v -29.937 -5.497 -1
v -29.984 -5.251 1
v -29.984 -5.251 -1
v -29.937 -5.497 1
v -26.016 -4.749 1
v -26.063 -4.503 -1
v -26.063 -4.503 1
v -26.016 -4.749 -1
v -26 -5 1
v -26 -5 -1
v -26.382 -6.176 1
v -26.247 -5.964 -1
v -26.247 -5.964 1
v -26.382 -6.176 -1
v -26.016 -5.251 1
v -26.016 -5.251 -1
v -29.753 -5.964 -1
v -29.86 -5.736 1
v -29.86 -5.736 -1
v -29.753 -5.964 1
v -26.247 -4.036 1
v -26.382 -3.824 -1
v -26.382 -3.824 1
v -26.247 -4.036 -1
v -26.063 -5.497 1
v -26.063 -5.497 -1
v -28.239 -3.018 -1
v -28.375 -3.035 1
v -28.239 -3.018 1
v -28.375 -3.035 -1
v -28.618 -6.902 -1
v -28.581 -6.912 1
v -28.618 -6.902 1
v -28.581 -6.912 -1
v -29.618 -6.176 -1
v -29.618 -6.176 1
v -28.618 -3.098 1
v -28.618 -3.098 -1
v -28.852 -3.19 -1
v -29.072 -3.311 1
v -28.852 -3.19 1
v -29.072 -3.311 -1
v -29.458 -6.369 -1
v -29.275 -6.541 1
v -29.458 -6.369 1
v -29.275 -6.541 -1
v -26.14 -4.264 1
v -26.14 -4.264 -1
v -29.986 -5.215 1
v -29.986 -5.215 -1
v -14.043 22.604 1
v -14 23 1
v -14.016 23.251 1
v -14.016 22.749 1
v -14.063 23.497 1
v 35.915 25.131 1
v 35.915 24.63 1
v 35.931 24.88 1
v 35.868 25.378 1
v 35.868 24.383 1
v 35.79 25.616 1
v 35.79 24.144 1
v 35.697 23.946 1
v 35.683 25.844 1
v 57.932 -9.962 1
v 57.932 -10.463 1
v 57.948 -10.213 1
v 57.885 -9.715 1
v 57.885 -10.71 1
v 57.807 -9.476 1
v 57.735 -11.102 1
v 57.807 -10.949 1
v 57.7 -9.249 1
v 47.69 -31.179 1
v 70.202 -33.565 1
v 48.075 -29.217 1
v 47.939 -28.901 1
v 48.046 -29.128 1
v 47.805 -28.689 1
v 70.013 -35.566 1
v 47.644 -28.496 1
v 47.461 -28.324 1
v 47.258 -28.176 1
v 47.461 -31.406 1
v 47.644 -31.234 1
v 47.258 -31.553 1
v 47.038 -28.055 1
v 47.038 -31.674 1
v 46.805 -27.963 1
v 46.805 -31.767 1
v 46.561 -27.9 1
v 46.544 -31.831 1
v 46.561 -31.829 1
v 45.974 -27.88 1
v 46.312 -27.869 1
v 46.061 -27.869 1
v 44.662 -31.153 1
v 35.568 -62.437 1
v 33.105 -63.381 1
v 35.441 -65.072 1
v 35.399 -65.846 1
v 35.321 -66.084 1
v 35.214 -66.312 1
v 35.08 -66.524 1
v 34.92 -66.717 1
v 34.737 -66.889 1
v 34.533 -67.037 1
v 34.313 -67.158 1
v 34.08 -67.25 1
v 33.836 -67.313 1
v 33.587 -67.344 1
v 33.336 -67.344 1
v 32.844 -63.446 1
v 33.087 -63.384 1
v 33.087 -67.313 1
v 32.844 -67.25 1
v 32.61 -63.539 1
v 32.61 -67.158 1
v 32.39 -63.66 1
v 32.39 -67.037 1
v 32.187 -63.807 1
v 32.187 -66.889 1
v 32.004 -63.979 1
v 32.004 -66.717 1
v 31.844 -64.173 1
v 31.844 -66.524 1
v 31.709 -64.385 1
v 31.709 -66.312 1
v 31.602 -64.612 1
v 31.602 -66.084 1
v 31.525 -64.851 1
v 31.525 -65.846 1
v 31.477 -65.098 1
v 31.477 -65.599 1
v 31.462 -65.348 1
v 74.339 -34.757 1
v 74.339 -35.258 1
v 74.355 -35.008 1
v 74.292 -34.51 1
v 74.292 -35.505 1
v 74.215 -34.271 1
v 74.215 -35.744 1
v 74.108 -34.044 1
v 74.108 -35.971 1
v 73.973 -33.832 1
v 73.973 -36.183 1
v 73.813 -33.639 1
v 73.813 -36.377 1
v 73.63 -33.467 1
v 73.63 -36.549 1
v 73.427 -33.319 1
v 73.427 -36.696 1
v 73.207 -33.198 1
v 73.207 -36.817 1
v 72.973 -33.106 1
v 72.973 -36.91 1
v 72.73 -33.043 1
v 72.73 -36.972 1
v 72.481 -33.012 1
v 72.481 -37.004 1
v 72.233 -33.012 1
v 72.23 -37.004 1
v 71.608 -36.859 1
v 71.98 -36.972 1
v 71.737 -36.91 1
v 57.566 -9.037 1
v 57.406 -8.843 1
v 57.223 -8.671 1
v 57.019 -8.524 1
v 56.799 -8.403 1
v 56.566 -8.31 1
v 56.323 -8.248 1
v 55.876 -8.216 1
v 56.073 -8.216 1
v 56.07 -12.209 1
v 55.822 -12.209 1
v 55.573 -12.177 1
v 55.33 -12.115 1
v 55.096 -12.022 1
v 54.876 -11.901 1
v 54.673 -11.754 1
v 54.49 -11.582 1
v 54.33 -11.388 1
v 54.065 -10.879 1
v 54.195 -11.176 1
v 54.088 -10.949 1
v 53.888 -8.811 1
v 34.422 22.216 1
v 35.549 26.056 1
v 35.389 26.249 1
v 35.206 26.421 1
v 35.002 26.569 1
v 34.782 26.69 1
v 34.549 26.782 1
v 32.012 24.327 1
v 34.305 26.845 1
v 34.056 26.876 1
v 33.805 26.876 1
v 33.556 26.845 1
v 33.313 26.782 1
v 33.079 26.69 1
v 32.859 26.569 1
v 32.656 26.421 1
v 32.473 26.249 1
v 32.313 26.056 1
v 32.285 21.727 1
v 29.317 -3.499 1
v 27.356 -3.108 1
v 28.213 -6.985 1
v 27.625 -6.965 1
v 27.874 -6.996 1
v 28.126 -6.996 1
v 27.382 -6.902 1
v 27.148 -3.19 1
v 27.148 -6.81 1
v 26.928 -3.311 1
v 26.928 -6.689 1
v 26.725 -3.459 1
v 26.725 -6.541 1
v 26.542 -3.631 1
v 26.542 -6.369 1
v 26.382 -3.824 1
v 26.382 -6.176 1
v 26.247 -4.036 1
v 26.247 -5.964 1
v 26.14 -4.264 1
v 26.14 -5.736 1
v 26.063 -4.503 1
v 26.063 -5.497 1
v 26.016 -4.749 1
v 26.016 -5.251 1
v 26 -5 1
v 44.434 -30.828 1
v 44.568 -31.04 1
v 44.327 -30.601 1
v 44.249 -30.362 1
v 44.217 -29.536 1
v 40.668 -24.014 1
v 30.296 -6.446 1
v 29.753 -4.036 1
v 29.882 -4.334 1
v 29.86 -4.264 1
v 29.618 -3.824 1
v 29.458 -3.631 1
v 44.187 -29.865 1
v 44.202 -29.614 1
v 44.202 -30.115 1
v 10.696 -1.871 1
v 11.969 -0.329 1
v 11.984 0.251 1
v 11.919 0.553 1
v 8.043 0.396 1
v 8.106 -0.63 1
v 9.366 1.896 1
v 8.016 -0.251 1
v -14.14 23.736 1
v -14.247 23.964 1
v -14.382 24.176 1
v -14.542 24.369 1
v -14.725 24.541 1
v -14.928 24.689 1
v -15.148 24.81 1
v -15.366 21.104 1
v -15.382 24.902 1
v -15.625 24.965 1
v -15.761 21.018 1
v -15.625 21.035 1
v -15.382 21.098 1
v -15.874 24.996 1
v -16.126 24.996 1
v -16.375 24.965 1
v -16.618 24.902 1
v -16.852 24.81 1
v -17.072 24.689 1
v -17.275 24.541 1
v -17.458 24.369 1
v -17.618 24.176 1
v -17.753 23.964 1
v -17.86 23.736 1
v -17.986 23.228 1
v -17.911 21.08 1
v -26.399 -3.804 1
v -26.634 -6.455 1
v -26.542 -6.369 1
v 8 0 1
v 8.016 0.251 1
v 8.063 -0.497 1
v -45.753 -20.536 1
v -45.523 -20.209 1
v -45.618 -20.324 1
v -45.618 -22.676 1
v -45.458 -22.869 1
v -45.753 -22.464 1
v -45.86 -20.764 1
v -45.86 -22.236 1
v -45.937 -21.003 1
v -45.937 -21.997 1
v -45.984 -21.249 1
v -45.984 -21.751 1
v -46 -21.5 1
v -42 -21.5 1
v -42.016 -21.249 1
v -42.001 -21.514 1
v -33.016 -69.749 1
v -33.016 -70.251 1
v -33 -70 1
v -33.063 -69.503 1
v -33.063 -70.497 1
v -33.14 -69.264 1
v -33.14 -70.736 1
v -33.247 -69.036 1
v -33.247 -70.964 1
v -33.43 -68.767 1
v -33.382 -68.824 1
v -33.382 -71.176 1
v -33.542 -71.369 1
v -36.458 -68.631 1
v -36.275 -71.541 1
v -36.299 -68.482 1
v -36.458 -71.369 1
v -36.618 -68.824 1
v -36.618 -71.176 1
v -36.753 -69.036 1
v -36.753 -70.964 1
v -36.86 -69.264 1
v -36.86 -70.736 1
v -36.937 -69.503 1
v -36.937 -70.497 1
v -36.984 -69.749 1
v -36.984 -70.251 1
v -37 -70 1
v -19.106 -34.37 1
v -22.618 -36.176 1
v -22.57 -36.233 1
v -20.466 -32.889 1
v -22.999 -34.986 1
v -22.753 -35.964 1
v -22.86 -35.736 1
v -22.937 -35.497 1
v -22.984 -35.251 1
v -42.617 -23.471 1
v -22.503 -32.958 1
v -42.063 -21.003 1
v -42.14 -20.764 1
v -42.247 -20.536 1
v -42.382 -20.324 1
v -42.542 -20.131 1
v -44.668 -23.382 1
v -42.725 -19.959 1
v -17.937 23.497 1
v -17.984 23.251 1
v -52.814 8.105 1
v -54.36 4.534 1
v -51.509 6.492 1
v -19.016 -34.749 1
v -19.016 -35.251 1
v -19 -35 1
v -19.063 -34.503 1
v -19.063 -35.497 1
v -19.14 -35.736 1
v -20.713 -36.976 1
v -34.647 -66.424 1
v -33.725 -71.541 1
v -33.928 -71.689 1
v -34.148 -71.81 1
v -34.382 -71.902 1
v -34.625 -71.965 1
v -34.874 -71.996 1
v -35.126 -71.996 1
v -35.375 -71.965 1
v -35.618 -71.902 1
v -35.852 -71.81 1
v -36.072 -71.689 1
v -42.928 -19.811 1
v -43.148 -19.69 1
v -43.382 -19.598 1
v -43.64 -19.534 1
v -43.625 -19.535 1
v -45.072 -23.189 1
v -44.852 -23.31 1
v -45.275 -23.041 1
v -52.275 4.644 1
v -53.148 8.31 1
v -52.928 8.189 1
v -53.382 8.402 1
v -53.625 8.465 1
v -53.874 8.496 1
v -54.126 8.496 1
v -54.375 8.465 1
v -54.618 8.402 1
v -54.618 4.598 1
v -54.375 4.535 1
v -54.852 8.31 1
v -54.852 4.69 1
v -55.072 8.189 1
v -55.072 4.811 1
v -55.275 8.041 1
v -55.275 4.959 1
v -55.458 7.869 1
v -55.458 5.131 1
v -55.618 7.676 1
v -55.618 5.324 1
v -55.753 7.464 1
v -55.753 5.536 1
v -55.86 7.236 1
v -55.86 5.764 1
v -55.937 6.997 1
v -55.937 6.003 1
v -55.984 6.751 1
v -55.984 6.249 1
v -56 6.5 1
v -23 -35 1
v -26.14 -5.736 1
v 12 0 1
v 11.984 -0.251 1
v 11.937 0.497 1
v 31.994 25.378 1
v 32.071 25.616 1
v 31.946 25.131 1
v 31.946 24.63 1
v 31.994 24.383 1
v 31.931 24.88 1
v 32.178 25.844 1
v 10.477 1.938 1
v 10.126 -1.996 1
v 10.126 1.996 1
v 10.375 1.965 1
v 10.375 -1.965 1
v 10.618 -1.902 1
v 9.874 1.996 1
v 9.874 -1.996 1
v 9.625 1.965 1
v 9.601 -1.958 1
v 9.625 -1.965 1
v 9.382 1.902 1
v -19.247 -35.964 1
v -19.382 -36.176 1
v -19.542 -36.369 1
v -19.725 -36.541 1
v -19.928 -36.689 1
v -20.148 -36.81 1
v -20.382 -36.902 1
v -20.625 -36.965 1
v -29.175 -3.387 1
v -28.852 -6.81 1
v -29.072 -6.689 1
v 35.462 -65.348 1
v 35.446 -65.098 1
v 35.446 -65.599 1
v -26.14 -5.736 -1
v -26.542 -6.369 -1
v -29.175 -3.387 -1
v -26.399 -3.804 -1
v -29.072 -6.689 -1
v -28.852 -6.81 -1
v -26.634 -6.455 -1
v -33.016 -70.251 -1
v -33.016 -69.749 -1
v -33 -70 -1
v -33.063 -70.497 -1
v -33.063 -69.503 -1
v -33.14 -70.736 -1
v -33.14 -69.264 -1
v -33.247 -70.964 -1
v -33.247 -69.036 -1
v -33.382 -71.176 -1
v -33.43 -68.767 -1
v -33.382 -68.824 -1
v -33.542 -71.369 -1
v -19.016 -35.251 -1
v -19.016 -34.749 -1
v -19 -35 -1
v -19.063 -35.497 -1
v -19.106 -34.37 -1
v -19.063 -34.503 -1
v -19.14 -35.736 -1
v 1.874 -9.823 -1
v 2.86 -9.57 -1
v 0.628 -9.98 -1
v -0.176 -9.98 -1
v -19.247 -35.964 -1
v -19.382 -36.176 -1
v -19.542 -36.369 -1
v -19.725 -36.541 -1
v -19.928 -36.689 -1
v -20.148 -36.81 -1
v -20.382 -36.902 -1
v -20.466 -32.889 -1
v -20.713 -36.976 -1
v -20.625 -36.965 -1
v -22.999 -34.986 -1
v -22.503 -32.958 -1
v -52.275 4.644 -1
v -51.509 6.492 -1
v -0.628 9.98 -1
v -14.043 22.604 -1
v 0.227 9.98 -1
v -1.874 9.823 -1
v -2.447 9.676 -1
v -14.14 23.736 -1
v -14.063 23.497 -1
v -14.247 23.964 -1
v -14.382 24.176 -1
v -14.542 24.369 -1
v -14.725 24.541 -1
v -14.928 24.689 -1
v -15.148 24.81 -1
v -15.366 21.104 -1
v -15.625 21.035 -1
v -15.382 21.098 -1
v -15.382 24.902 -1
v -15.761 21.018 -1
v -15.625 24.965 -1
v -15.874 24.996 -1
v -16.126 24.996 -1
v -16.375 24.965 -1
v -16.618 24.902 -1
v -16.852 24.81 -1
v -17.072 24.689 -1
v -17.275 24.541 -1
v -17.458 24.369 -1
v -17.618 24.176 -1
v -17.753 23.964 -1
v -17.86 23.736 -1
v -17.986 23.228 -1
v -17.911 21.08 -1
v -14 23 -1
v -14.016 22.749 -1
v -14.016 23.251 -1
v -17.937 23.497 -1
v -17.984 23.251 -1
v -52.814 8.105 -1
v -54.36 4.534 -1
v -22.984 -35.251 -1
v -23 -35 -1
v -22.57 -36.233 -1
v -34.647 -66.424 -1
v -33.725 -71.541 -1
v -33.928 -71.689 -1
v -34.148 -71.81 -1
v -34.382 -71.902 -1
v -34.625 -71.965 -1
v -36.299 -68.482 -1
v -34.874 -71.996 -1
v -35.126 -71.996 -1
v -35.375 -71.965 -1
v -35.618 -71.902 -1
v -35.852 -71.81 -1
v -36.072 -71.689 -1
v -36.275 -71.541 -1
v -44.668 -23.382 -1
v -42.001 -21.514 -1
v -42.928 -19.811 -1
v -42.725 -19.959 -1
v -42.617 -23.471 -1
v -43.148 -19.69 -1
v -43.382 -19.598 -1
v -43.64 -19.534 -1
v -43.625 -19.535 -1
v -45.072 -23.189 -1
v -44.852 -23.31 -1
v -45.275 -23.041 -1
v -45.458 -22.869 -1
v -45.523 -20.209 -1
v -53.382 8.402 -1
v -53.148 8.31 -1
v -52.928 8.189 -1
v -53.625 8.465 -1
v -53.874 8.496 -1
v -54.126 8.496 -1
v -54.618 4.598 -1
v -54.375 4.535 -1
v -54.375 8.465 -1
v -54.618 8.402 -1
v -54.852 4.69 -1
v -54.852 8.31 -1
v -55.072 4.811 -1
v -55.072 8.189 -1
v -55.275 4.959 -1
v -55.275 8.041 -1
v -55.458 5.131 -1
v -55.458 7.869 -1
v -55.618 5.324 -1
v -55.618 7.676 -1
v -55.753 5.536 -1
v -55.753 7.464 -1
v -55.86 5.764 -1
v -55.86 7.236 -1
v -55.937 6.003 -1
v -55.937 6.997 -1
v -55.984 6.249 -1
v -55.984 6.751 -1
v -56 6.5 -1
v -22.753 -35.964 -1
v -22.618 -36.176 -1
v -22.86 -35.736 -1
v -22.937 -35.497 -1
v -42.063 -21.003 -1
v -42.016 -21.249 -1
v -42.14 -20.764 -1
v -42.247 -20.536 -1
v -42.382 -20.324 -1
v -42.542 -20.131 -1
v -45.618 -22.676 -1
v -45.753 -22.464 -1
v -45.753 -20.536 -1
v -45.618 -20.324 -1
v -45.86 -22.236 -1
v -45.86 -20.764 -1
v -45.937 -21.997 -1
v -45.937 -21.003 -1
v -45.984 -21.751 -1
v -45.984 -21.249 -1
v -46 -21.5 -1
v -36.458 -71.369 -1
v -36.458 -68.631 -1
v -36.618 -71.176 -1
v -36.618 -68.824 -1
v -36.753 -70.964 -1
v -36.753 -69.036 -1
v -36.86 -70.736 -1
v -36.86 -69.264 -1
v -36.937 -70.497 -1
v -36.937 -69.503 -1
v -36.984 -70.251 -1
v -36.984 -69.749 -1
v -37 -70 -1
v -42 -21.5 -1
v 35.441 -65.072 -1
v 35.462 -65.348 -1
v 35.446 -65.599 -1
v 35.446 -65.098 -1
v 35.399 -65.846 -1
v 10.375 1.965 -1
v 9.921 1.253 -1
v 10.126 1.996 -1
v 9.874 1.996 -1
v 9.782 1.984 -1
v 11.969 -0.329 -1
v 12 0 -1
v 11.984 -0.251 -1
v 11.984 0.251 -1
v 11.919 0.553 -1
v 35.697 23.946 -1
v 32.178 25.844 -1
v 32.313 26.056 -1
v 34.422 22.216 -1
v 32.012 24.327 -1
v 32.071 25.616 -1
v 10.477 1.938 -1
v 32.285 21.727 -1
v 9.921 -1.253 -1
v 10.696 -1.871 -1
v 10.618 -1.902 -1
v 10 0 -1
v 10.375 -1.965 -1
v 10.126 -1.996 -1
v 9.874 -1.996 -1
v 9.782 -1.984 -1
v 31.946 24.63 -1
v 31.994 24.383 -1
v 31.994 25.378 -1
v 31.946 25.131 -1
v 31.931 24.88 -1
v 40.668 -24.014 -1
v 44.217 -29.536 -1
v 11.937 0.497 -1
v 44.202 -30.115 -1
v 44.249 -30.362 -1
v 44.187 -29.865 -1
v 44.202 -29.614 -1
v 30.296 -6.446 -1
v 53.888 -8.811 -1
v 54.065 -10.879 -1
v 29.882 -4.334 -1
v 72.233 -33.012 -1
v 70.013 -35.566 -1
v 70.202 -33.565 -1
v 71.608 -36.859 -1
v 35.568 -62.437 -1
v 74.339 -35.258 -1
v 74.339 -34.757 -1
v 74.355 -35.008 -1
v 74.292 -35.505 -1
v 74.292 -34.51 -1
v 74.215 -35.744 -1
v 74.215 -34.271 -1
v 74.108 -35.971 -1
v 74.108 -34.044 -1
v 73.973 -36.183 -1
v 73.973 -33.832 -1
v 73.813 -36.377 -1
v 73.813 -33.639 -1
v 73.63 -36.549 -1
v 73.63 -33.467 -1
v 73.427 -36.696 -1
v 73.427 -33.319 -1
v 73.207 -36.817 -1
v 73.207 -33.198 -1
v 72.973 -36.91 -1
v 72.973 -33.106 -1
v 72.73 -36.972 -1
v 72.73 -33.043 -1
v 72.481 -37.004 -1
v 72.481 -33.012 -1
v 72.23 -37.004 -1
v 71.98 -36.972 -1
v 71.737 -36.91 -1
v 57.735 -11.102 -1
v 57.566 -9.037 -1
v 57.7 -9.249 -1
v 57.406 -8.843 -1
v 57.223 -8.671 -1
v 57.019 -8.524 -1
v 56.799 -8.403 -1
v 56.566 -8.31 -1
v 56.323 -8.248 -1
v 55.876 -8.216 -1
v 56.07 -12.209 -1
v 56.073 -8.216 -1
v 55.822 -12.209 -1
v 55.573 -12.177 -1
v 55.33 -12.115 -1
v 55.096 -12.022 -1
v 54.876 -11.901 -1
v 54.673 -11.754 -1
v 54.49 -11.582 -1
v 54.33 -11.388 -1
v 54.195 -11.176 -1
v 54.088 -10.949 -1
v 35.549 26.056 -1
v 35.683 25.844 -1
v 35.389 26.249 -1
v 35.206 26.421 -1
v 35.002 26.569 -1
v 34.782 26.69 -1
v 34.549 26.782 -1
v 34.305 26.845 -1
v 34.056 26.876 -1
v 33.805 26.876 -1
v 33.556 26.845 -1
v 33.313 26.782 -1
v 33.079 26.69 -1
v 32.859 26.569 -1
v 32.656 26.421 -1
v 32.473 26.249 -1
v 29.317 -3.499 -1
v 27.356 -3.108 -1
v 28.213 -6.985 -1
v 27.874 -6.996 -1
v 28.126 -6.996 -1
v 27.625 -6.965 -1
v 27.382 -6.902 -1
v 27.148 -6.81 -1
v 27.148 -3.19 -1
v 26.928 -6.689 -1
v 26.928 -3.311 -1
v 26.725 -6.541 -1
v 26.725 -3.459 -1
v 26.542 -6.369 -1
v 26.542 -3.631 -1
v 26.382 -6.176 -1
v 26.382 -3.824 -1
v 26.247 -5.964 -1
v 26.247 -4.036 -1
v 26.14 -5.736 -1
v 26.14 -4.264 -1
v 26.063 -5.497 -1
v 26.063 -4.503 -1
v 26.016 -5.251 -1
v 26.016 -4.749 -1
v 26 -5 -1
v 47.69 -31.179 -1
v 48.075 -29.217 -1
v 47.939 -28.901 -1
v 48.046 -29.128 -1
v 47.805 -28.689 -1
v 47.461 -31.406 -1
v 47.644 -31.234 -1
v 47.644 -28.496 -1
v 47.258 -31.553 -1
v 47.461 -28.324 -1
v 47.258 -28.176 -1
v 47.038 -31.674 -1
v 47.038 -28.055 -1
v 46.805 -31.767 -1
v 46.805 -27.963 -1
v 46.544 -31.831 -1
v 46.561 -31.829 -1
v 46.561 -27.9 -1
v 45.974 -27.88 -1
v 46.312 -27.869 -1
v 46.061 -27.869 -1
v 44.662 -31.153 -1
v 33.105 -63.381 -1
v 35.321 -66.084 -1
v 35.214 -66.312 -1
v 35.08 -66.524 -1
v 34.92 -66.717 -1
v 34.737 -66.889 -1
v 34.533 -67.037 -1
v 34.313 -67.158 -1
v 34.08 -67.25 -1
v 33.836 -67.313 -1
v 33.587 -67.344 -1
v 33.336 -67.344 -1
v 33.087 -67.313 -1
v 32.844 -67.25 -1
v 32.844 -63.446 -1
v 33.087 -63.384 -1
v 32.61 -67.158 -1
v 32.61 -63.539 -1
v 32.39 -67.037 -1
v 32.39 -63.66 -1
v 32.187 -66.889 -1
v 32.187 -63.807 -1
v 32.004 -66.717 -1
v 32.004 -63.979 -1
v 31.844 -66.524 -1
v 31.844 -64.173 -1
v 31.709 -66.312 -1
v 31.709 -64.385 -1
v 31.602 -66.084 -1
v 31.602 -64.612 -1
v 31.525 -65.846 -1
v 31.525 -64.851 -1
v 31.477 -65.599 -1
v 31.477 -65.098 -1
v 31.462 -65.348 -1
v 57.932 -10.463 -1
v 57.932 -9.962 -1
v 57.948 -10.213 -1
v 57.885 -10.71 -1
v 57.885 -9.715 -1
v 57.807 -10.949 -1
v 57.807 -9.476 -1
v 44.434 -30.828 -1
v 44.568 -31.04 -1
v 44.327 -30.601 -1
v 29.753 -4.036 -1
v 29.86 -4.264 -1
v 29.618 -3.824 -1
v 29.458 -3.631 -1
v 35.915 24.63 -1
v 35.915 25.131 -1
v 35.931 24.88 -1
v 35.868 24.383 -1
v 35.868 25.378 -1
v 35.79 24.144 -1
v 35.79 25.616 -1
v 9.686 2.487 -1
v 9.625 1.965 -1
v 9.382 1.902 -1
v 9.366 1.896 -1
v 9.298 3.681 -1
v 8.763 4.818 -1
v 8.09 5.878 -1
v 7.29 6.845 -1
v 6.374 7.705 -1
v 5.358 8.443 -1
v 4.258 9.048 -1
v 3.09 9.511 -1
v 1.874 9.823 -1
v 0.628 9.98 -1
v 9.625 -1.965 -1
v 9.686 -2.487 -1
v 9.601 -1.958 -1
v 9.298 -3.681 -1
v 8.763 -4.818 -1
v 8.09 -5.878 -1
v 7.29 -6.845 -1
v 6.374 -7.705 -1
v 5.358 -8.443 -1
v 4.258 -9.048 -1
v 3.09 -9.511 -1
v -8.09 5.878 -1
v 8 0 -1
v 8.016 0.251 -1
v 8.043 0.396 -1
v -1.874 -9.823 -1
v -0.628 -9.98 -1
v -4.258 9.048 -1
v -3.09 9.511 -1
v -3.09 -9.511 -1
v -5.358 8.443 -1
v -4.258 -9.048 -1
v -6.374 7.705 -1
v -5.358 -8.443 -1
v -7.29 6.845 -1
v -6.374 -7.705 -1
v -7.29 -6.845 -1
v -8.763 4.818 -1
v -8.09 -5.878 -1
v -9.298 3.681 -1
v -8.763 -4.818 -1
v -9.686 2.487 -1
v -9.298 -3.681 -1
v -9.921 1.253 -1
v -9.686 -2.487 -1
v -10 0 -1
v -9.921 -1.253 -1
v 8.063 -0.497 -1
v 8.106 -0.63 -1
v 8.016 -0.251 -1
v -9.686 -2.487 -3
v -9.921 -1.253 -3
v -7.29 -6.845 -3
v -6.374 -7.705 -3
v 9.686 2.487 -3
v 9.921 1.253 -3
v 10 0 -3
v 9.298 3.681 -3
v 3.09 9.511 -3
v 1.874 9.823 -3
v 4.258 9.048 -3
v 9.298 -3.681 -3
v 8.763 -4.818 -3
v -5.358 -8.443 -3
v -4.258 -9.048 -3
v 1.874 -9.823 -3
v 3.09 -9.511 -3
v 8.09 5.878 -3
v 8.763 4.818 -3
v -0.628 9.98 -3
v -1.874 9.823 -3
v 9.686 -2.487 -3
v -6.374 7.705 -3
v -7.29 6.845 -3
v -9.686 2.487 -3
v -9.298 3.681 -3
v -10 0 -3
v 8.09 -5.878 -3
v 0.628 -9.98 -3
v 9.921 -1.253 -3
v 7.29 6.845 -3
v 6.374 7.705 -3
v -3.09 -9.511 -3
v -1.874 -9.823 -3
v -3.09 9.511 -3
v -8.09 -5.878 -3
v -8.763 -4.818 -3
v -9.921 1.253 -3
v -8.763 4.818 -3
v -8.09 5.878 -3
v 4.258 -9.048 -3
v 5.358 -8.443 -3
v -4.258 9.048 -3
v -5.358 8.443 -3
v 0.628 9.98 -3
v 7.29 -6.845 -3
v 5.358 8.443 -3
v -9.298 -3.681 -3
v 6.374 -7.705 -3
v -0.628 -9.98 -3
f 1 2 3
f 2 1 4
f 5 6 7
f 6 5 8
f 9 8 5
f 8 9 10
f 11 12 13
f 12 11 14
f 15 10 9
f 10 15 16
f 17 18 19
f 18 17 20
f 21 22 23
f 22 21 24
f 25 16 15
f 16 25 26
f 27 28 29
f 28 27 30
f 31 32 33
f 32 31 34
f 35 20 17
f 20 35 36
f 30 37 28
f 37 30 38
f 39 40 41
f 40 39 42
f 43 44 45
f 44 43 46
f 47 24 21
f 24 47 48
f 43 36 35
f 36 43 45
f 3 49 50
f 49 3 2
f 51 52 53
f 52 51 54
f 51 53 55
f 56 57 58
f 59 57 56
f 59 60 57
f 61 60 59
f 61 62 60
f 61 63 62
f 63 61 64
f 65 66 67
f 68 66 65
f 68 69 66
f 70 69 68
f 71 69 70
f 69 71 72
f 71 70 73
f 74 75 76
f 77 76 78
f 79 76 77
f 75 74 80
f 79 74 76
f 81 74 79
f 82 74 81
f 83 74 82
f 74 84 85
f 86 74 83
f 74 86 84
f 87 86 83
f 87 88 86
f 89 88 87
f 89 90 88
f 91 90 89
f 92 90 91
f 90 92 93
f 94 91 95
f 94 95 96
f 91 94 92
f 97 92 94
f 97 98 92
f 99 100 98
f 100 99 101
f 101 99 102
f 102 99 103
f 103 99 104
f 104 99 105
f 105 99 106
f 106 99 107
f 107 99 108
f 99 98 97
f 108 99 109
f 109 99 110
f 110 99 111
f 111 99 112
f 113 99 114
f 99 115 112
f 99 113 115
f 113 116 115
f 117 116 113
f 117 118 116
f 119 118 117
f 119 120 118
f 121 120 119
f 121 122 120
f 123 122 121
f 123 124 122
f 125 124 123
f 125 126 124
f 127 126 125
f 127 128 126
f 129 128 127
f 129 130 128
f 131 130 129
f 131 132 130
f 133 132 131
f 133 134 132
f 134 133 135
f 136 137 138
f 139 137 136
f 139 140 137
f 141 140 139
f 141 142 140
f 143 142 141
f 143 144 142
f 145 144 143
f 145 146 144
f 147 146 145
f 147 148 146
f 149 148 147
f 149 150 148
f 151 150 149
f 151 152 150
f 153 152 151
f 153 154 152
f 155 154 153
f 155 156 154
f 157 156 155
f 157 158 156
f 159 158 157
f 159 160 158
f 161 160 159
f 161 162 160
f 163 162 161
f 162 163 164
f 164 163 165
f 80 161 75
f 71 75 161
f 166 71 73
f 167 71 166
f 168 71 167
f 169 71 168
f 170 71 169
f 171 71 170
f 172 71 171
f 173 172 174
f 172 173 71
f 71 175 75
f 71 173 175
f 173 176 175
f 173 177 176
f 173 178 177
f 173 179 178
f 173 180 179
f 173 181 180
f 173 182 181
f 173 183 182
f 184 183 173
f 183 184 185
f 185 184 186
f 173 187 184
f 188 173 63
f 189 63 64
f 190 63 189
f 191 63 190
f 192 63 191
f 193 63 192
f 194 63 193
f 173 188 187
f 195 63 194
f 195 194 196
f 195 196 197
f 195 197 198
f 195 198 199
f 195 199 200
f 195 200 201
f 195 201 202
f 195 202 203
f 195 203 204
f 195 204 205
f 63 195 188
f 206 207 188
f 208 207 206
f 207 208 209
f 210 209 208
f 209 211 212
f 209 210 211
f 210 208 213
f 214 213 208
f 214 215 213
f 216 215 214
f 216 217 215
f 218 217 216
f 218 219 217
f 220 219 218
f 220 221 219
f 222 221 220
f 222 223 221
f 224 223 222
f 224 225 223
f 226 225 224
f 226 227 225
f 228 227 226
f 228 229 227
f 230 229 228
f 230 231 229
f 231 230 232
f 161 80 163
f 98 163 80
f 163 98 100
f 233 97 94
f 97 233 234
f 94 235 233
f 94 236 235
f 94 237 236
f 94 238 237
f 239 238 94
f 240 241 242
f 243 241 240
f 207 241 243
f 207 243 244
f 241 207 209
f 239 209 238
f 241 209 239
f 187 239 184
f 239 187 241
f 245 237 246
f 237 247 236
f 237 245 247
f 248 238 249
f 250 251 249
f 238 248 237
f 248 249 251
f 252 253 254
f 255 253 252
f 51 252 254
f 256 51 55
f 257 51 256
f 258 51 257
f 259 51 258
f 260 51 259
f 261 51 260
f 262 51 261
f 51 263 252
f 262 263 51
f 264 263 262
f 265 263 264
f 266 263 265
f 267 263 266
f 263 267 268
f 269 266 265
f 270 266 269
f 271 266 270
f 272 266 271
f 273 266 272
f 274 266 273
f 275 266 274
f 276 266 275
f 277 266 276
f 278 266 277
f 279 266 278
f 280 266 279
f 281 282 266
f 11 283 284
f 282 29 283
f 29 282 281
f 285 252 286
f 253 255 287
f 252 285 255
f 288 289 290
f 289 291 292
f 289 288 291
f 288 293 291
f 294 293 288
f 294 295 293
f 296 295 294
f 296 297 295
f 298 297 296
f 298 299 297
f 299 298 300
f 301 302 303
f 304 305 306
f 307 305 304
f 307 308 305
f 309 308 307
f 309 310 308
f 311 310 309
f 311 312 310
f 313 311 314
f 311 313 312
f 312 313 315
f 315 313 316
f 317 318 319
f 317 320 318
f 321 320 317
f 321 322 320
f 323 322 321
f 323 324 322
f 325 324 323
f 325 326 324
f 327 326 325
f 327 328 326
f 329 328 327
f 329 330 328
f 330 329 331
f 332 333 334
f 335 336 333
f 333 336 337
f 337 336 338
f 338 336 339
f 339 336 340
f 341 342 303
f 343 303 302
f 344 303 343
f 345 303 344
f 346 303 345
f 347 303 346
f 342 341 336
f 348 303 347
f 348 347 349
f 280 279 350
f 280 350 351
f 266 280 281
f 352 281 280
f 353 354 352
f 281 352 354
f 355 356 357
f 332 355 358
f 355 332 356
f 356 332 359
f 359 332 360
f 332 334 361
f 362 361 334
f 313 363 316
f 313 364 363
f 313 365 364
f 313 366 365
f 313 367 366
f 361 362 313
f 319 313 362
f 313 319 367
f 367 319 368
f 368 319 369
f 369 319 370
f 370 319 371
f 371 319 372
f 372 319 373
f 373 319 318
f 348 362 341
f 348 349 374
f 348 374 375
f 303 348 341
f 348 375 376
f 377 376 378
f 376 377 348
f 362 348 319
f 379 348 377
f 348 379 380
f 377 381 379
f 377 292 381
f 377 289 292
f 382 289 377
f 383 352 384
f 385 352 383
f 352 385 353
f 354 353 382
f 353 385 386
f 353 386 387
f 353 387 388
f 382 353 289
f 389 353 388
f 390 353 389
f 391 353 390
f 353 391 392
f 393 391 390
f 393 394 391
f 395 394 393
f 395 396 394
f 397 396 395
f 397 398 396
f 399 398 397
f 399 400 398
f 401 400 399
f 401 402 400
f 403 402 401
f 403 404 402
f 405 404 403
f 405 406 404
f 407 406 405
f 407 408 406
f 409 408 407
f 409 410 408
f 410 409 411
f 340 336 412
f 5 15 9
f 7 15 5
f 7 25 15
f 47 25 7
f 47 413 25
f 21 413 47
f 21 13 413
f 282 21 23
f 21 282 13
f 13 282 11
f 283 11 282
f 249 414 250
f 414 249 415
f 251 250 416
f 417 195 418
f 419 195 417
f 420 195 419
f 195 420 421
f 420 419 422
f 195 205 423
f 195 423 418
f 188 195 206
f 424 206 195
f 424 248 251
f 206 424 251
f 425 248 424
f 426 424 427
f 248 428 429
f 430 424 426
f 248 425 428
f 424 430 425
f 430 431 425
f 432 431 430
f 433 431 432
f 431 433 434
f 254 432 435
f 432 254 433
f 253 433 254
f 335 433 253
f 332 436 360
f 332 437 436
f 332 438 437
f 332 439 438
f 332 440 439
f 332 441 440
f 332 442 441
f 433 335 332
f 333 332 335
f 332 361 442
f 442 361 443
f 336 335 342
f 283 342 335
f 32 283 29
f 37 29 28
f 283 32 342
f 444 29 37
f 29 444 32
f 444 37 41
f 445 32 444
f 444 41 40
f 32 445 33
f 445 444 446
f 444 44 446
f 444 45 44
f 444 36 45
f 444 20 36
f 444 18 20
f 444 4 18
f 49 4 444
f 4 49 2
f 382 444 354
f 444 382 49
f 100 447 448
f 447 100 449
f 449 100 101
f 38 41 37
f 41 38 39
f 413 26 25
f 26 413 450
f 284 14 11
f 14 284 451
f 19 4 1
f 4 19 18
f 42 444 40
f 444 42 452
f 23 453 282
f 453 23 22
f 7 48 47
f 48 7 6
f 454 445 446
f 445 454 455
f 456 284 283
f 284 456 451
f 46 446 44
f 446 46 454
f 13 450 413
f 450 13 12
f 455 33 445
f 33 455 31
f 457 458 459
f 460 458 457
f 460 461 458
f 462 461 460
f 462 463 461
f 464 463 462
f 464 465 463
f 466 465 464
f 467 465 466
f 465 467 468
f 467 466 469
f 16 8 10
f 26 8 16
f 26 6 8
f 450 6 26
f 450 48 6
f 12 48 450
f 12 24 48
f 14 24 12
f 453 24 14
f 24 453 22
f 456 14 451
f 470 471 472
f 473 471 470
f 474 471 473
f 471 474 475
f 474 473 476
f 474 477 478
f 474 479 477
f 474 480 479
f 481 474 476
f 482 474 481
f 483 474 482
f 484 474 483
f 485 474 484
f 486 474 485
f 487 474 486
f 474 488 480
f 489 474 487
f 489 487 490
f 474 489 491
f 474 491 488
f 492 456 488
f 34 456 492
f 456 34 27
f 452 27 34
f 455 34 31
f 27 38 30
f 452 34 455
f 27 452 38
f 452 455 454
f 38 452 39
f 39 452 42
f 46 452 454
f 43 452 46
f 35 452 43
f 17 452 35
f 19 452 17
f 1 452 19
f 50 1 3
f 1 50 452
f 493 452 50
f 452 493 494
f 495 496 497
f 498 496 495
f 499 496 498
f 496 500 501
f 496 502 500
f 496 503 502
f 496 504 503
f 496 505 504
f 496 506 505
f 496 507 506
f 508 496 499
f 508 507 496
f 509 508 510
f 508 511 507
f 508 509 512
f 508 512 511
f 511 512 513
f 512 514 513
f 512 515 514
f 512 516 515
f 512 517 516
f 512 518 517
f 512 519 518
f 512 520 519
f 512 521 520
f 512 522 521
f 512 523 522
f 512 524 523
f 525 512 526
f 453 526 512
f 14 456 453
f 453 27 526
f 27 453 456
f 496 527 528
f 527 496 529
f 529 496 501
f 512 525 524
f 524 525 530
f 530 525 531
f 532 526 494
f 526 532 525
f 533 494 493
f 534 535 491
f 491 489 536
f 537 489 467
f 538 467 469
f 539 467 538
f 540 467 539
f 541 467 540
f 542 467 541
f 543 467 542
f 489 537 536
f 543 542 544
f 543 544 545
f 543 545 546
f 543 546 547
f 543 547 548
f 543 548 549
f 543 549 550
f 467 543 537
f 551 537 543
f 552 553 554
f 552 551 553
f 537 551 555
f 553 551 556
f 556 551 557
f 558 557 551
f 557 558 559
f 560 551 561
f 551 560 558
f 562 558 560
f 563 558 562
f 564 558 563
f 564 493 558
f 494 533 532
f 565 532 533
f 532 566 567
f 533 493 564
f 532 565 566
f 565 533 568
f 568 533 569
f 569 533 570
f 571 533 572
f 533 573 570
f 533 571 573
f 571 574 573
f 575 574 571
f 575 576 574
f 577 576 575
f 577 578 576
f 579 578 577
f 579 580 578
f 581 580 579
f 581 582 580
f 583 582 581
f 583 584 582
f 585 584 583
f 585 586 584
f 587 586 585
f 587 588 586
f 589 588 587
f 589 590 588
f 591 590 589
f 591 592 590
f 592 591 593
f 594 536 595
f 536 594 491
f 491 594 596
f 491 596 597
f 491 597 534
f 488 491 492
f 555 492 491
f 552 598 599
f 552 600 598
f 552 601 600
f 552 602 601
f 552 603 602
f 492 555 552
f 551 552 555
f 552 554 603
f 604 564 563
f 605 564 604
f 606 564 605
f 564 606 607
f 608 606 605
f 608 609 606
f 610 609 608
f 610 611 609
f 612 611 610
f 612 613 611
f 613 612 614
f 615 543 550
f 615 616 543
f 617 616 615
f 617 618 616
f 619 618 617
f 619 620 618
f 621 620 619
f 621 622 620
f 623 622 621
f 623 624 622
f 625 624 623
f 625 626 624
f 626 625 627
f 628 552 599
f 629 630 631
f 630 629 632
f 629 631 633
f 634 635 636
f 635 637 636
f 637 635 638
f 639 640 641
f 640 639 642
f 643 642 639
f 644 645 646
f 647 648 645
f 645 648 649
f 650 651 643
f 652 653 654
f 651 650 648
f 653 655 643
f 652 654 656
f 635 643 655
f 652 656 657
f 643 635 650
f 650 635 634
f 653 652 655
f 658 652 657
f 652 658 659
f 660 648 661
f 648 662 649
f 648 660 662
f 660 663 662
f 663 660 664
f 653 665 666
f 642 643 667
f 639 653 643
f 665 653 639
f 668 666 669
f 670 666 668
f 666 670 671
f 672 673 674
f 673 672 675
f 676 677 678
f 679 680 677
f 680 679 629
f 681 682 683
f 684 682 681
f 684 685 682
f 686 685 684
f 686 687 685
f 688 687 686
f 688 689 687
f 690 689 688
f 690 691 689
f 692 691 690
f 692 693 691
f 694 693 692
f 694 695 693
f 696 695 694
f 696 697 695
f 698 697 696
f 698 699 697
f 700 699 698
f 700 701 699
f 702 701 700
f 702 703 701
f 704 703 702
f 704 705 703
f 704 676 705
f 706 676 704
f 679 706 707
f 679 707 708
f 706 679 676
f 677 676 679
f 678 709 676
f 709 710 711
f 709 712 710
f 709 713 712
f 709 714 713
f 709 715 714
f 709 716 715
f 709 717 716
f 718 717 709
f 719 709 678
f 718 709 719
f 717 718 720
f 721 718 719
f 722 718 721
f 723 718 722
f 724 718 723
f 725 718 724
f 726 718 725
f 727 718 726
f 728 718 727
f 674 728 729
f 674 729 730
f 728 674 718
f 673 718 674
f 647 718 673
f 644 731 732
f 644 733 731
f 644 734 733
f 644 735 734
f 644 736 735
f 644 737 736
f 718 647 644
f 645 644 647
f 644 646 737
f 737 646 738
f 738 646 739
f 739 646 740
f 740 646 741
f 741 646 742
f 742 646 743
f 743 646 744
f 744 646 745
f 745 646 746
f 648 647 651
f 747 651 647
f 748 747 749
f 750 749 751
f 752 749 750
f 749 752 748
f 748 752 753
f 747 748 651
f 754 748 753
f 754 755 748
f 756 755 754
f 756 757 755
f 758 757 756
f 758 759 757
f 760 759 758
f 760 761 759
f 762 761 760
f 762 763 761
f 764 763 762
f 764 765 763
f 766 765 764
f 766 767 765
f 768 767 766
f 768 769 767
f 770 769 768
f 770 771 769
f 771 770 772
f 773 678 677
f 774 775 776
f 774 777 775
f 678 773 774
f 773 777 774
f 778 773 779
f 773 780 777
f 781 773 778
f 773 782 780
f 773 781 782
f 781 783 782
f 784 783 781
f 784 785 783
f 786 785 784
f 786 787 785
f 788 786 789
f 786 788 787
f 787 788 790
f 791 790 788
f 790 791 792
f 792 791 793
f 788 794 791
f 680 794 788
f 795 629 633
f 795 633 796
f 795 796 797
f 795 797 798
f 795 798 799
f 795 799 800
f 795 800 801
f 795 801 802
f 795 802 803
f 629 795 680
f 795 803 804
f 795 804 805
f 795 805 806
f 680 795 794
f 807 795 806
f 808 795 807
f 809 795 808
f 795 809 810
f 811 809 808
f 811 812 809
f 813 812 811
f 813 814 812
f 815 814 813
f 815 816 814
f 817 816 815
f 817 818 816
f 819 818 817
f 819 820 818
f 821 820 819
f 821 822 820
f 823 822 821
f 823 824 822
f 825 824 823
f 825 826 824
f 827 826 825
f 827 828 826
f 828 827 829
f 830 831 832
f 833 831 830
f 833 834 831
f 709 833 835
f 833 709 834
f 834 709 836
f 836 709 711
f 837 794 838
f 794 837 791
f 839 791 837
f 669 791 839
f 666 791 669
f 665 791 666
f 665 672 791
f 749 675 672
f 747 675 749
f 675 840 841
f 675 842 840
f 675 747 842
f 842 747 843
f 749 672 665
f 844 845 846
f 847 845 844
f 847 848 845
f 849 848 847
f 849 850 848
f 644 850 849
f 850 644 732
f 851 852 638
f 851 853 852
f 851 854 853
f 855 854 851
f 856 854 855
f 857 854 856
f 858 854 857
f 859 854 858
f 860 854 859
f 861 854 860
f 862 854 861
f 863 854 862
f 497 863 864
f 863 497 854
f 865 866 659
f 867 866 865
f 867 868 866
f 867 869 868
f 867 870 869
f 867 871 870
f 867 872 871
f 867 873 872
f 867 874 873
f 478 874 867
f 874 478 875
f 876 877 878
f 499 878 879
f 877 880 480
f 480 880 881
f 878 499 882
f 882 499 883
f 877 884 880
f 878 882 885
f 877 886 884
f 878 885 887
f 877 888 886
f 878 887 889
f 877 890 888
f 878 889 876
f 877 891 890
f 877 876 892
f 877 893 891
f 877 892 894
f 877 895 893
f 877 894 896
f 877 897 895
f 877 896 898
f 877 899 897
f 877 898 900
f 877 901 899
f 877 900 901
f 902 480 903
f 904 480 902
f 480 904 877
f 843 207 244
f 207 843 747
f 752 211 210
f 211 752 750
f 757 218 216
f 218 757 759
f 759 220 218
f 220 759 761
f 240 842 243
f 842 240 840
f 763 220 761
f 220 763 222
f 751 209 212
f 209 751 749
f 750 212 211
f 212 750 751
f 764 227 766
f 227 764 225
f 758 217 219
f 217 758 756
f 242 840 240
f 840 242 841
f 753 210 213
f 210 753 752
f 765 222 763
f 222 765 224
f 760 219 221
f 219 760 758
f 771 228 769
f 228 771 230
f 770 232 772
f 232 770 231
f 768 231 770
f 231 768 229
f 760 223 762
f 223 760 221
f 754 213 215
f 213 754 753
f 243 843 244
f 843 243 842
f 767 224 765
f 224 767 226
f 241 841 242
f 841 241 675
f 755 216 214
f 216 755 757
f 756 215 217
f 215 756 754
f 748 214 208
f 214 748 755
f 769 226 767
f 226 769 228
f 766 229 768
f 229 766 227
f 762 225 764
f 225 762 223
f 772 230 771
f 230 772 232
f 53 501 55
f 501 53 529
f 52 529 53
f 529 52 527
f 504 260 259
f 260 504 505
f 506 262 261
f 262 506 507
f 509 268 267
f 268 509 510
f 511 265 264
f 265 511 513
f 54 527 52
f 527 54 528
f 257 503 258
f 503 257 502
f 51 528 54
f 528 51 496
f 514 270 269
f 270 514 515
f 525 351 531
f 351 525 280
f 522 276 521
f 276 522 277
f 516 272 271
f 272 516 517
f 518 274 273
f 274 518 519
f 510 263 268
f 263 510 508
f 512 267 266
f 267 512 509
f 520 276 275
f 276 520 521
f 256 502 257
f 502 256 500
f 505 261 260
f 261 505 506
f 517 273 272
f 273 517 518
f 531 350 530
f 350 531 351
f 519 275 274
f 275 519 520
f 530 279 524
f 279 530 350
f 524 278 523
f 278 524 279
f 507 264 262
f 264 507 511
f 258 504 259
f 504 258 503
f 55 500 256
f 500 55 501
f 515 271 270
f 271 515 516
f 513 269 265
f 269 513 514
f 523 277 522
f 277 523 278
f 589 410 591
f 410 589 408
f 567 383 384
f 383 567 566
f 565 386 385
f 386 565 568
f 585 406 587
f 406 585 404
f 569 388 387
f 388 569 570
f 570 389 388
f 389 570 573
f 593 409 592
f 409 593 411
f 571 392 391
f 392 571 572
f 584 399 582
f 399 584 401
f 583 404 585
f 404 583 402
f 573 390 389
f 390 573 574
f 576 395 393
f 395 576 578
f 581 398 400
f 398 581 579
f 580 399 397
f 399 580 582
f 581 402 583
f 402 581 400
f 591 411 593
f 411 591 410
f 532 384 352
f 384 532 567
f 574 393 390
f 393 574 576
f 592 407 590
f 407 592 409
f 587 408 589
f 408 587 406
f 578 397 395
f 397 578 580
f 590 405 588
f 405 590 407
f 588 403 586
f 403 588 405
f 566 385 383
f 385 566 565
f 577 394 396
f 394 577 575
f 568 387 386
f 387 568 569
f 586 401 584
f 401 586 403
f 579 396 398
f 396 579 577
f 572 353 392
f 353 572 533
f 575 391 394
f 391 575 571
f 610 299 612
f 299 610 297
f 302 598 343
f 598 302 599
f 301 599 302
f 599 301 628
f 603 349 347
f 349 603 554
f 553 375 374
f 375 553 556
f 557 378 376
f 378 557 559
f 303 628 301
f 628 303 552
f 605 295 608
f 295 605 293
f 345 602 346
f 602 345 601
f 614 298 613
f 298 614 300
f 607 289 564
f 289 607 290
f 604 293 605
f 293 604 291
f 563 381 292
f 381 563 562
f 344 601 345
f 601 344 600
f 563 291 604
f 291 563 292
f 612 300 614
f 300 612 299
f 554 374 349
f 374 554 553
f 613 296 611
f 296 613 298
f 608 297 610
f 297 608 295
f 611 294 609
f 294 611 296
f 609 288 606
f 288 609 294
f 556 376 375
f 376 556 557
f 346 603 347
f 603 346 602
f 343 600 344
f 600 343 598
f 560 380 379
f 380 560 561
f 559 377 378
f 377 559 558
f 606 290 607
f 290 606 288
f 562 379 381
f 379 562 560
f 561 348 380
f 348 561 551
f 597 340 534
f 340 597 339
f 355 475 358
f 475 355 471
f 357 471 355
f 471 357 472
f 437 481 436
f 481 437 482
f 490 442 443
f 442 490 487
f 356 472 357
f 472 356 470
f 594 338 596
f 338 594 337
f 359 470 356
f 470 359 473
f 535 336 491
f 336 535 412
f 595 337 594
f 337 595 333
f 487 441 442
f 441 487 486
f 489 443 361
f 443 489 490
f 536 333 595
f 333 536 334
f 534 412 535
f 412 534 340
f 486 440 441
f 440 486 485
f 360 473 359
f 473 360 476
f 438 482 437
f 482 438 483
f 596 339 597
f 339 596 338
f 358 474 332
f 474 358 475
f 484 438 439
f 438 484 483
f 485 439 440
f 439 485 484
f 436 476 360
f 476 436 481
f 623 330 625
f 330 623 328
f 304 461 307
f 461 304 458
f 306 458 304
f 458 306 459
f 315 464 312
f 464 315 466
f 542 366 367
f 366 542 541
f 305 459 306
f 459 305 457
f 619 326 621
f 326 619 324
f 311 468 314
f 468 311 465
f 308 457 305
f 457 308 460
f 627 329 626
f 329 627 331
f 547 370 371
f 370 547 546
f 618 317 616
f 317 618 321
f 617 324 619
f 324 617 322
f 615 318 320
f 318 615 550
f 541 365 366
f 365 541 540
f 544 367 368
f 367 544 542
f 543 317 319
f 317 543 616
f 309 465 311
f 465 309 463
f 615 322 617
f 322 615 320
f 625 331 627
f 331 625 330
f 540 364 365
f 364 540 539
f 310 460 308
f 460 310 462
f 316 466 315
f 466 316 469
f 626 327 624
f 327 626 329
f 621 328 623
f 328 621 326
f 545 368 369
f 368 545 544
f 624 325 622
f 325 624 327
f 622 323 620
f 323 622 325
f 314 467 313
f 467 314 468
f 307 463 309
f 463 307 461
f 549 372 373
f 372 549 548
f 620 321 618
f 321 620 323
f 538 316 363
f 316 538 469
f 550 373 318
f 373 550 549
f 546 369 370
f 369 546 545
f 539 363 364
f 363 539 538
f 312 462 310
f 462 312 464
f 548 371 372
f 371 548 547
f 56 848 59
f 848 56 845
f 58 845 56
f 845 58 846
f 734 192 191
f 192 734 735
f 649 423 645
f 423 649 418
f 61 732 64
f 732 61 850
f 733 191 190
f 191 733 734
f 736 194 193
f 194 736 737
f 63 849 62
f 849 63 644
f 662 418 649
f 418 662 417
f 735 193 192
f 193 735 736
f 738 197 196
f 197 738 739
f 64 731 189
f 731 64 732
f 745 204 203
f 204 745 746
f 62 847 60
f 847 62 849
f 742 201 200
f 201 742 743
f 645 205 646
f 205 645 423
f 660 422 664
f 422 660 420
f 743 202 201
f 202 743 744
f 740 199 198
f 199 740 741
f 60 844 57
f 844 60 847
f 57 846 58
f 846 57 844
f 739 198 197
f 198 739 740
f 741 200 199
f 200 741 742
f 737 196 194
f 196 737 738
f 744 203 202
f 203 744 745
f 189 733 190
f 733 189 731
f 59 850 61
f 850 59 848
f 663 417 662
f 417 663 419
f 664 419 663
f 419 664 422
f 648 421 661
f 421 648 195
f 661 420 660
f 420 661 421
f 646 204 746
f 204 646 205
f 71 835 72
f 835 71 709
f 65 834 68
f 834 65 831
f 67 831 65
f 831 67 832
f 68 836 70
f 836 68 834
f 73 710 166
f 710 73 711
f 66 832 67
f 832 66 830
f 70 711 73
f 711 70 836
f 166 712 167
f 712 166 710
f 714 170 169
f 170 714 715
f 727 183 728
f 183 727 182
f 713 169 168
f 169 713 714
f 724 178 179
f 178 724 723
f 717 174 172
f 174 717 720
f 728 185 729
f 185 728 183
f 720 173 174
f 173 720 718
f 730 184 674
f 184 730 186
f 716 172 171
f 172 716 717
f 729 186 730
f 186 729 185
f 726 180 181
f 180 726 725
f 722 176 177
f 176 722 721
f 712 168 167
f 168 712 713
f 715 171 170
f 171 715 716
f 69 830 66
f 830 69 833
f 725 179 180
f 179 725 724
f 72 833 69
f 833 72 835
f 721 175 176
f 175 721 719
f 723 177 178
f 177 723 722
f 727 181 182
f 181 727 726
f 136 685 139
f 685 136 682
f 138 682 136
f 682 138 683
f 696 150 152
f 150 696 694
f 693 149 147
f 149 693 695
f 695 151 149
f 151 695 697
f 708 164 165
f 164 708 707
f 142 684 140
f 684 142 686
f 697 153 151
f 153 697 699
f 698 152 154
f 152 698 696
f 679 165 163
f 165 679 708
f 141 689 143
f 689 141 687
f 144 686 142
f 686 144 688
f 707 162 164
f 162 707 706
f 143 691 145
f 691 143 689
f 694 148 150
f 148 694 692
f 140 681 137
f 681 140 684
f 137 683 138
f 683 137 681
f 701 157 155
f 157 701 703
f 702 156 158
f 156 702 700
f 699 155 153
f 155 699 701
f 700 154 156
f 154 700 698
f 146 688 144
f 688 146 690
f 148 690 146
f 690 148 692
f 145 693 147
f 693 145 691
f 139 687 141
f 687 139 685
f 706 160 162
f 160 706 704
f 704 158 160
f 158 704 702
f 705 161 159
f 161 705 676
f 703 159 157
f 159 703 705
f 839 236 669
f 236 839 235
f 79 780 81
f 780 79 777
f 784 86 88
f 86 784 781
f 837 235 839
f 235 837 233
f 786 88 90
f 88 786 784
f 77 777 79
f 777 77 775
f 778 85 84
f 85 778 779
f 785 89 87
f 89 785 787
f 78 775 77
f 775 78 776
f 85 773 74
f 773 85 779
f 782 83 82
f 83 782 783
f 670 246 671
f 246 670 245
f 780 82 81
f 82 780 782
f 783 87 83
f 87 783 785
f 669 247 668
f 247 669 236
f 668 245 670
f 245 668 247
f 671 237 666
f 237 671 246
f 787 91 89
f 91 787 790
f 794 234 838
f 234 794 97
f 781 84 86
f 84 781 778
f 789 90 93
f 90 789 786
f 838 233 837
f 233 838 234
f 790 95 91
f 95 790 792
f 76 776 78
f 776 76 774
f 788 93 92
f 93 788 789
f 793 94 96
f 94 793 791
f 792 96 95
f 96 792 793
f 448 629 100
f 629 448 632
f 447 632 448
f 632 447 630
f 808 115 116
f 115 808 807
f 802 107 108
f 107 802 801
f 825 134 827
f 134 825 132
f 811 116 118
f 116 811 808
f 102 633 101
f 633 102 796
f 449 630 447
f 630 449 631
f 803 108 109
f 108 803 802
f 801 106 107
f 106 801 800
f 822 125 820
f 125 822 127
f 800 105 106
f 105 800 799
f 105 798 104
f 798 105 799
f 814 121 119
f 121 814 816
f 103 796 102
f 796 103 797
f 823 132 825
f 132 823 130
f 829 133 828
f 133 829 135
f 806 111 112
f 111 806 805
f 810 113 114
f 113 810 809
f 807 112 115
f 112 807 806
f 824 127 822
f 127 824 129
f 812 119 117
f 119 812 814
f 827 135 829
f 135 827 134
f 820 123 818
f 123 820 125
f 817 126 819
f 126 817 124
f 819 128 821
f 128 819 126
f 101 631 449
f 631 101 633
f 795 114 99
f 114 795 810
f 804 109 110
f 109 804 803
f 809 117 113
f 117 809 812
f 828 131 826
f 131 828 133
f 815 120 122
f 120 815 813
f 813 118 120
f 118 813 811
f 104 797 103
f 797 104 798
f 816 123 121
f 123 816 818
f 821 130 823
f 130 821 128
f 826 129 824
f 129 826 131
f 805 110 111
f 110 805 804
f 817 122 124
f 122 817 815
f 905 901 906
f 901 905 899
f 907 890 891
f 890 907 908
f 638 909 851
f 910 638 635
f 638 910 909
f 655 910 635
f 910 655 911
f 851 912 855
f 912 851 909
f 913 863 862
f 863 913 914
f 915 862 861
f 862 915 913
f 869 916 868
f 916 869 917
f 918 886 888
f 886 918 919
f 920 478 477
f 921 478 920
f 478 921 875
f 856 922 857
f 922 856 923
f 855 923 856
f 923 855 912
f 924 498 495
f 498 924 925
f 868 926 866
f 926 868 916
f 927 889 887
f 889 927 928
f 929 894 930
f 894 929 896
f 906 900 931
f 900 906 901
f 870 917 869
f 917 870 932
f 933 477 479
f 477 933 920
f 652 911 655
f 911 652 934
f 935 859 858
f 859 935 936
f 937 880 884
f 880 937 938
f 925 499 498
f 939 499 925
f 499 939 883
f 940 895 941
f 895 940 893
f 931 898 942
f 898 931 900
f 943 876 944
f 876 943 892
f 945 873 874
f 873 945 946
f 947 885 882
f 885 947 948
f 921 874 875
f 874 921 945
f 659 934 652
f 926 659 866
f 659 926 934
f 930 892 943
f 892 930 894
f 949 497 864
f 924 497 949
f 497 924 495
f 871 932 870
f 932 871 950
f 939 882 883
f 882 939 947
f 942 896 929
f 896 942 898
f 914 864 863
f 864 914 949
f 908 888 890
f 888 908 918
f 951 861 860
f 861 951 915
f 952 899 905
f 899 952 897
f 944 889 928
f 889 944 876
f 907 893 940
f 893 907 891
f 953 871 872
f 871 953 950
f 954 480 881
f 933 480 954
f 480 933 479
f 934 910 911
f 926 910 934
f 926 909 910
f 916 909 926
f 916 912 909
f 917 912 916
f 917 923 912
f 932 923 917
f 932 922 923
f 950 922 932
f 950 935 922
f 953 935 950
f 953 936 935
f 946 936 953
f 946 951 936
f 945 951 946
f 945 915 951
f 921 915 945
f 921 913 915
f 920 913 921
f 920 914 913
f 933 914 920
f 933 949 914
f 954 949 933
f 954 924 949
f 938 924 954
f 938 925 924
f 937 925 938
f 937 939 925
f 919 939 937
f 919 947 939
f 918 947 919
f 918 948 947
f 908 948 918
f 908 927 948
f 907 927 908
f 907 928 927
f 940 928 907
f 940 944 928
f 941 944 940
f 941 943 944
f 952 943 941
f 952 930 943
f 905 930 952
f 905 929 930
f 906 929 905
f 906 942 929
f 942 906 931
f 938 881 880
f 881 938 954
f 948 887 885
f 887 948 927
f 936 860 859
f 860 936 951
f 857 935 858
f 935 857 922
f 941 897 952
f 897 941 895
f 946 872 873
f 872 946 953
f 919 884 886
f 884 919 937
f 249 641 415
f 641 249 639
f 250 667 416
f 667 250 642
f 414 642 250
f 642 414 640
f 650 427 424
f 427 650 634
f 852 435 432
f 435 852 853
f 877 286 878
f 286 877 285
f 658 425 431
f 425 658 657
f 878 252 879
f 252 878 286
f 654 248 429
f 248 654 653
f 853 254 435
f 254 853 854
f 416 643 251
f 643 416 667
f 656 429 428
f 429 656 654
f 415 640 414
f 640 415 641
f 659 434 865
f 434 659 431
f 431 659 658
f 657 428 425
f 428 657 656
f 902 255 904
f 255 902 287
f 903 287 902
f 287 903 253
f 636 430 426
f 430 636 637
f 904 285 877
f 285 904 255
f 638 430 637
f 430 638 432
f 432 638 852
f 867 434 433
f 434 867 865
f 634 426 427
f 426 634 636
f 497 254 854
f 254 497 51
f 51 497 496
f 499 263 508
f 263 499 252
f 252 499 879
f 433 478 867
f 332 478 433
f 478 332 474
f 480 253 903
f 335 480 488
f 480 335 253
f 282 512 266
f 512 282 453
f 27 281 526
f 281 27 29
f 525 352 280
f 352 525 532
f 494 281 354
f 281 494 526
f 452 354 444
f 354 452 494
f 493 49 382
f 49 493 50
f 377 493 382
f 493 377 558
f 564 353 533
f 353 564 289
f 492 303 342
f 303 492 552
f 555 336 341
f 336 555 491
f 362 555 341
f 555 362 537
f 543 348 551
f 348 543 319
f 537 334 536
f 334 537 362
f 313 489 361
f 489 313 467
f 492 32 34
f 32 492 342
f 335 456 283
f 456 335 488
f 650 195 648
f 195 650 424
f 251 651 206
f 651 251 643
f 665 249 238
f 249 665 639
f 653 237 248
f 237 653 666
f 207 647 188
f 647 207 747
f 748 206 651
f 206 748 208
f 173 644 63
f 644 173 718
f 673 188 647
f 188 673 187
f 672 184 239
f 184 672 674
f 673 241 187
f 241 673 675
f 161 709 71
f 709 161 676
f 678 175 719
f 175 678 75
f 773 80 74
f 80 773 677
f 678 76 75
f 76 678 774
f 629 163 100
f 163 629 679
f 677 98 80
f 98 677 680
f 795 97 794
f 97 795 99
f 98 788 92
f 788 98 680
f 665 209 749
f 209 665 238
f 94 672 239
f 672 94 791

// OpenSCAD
// OpenSCAD code for mechanism visualization
$fn=50; // Smooth rendering
color("red" )
translate([-28.0, -5.0,-1]) cylinder(h=2,r=2);
color("red" )
translate([28.0, -5.0,-1]) cylinder(h=2,r=2);
color("blue")
translate([-16.0, 23.0,-1]) cylinder(h=2,r=2);
color("blue")
translate([-54.0, 6.5,-1]) cylinder(h=2,r=2);
color("blue")
translate([-44.0, -21.5,-1]) cylinder(h=2,r=2);
color("blue")
translate([-21.0, -35.0,-1]) cylinder(h=2,r=2);
color("blue")
translate([-35.0, -70.0,-1]) cylinder(h=2,r=2);
color("blue")
translate([33.93072639447164, 24.88020221541209,-1]) cylinder(h=2,r=2);
color("blue")
translate([55.947804291478, -10.212507581312847,-1]) cylinder(h=2,r=2);
color("blue")
translate([72.35517987650988, -35.00762860162045,-1]) cylinder(h=2,r=2);
color("blue")
translate([46.18649895184087, -29.864658772536796,-1]) cylinder(h=2,r=2);
color("blue")
translate([33.46172075954302, -65.34817635403964,-1]) cylinder(h=2,r=2);
color("red")
translate([0, 0,-3]) cylinder(h=2,r=10);
color("blue")
translate([10.0, 0.0,-1]) cylinder(h=2,r=2);
module connection(p1, p2) {{dx = p2[0] - p1[0]; dy = p2[1] - p1[1]; length = sqrt(dx*dx + dy*dy); translate(p1) {{rotate([0, 0, atan2(dy, dx)]) {{translate([length/2, 0, 0]) cube([length, 2, 2], center=true); }}}}}}
color("gray")
connection([10.0, 0.0,0], [-16.0, 23.0,0]);
color("gray")
connection([10.0, 0.0,0], [-21.0, -35.0,0]);
color("gray")
connection([-16.0, 23.0,0], [-28.0, -5.0,0]);
color("gray")
connection([-16.0, 23.0,0], [-54.0, 6.5,0]);
color("gray")
connection([-54.0, 6.5,0], [-28.0, -5.0,0]);
color("gray")
connection([-54.0, 6.5,0], [-44.0, -21.5,0]);
color("gray")
connection([-44.0, -21.5,0], [-21.0, -35.0,0]);
color("gray")
connection([-44.0, -21.5,0], [-35.0, -70.0,0]);
color("gray")
connection([-35.0, -70.0,0], [-21.0, -35.0,0]);
color("gray")
connection([-21.0, -35.0,0], [-28.0, -5.0,0]);
color("gray")
connection([10.0, 0.0,0], [33.93072639447164, 24.88020221541209,0]);
color("gray")
connection([10.0, 0.0,0], [46.18649895184087, -29.864658772536796,0]);
color("gray")
connection([33.93072639447164, 24.88020221541209,0], [28.0, -5.0,0]);
color("gray")
connection([33.93072639447164, 24.88020221541209,0], [55.947804291478, -10.212507581312847,0]);
color("gray")
connection([55.947804291478, -10.212507581312847,0], [28.0, -5.0,0]);
color("gray")
connection([55.947804291478, -10.212507581312847,0], [72.35517987650988, -35.00762860162045,0]);
color("gray")
connection([72.35517987650988, -35.00762860162045,0], [46.18649895184087, -29.864658772536796,0]);
color("gray")
connection([72.35517987650988, -35.00762860162045,0], [33.46172075954302, -65.34817635403964,0]);
color("gray")
connection([33.46172075954302, -65.34817635403964,0], [46.18649895184087, -29.864658772536796,0]);
color("gray")
connection([46.18649895184087, -29.864658772536796,0], [28.0, -5.0,0]);
